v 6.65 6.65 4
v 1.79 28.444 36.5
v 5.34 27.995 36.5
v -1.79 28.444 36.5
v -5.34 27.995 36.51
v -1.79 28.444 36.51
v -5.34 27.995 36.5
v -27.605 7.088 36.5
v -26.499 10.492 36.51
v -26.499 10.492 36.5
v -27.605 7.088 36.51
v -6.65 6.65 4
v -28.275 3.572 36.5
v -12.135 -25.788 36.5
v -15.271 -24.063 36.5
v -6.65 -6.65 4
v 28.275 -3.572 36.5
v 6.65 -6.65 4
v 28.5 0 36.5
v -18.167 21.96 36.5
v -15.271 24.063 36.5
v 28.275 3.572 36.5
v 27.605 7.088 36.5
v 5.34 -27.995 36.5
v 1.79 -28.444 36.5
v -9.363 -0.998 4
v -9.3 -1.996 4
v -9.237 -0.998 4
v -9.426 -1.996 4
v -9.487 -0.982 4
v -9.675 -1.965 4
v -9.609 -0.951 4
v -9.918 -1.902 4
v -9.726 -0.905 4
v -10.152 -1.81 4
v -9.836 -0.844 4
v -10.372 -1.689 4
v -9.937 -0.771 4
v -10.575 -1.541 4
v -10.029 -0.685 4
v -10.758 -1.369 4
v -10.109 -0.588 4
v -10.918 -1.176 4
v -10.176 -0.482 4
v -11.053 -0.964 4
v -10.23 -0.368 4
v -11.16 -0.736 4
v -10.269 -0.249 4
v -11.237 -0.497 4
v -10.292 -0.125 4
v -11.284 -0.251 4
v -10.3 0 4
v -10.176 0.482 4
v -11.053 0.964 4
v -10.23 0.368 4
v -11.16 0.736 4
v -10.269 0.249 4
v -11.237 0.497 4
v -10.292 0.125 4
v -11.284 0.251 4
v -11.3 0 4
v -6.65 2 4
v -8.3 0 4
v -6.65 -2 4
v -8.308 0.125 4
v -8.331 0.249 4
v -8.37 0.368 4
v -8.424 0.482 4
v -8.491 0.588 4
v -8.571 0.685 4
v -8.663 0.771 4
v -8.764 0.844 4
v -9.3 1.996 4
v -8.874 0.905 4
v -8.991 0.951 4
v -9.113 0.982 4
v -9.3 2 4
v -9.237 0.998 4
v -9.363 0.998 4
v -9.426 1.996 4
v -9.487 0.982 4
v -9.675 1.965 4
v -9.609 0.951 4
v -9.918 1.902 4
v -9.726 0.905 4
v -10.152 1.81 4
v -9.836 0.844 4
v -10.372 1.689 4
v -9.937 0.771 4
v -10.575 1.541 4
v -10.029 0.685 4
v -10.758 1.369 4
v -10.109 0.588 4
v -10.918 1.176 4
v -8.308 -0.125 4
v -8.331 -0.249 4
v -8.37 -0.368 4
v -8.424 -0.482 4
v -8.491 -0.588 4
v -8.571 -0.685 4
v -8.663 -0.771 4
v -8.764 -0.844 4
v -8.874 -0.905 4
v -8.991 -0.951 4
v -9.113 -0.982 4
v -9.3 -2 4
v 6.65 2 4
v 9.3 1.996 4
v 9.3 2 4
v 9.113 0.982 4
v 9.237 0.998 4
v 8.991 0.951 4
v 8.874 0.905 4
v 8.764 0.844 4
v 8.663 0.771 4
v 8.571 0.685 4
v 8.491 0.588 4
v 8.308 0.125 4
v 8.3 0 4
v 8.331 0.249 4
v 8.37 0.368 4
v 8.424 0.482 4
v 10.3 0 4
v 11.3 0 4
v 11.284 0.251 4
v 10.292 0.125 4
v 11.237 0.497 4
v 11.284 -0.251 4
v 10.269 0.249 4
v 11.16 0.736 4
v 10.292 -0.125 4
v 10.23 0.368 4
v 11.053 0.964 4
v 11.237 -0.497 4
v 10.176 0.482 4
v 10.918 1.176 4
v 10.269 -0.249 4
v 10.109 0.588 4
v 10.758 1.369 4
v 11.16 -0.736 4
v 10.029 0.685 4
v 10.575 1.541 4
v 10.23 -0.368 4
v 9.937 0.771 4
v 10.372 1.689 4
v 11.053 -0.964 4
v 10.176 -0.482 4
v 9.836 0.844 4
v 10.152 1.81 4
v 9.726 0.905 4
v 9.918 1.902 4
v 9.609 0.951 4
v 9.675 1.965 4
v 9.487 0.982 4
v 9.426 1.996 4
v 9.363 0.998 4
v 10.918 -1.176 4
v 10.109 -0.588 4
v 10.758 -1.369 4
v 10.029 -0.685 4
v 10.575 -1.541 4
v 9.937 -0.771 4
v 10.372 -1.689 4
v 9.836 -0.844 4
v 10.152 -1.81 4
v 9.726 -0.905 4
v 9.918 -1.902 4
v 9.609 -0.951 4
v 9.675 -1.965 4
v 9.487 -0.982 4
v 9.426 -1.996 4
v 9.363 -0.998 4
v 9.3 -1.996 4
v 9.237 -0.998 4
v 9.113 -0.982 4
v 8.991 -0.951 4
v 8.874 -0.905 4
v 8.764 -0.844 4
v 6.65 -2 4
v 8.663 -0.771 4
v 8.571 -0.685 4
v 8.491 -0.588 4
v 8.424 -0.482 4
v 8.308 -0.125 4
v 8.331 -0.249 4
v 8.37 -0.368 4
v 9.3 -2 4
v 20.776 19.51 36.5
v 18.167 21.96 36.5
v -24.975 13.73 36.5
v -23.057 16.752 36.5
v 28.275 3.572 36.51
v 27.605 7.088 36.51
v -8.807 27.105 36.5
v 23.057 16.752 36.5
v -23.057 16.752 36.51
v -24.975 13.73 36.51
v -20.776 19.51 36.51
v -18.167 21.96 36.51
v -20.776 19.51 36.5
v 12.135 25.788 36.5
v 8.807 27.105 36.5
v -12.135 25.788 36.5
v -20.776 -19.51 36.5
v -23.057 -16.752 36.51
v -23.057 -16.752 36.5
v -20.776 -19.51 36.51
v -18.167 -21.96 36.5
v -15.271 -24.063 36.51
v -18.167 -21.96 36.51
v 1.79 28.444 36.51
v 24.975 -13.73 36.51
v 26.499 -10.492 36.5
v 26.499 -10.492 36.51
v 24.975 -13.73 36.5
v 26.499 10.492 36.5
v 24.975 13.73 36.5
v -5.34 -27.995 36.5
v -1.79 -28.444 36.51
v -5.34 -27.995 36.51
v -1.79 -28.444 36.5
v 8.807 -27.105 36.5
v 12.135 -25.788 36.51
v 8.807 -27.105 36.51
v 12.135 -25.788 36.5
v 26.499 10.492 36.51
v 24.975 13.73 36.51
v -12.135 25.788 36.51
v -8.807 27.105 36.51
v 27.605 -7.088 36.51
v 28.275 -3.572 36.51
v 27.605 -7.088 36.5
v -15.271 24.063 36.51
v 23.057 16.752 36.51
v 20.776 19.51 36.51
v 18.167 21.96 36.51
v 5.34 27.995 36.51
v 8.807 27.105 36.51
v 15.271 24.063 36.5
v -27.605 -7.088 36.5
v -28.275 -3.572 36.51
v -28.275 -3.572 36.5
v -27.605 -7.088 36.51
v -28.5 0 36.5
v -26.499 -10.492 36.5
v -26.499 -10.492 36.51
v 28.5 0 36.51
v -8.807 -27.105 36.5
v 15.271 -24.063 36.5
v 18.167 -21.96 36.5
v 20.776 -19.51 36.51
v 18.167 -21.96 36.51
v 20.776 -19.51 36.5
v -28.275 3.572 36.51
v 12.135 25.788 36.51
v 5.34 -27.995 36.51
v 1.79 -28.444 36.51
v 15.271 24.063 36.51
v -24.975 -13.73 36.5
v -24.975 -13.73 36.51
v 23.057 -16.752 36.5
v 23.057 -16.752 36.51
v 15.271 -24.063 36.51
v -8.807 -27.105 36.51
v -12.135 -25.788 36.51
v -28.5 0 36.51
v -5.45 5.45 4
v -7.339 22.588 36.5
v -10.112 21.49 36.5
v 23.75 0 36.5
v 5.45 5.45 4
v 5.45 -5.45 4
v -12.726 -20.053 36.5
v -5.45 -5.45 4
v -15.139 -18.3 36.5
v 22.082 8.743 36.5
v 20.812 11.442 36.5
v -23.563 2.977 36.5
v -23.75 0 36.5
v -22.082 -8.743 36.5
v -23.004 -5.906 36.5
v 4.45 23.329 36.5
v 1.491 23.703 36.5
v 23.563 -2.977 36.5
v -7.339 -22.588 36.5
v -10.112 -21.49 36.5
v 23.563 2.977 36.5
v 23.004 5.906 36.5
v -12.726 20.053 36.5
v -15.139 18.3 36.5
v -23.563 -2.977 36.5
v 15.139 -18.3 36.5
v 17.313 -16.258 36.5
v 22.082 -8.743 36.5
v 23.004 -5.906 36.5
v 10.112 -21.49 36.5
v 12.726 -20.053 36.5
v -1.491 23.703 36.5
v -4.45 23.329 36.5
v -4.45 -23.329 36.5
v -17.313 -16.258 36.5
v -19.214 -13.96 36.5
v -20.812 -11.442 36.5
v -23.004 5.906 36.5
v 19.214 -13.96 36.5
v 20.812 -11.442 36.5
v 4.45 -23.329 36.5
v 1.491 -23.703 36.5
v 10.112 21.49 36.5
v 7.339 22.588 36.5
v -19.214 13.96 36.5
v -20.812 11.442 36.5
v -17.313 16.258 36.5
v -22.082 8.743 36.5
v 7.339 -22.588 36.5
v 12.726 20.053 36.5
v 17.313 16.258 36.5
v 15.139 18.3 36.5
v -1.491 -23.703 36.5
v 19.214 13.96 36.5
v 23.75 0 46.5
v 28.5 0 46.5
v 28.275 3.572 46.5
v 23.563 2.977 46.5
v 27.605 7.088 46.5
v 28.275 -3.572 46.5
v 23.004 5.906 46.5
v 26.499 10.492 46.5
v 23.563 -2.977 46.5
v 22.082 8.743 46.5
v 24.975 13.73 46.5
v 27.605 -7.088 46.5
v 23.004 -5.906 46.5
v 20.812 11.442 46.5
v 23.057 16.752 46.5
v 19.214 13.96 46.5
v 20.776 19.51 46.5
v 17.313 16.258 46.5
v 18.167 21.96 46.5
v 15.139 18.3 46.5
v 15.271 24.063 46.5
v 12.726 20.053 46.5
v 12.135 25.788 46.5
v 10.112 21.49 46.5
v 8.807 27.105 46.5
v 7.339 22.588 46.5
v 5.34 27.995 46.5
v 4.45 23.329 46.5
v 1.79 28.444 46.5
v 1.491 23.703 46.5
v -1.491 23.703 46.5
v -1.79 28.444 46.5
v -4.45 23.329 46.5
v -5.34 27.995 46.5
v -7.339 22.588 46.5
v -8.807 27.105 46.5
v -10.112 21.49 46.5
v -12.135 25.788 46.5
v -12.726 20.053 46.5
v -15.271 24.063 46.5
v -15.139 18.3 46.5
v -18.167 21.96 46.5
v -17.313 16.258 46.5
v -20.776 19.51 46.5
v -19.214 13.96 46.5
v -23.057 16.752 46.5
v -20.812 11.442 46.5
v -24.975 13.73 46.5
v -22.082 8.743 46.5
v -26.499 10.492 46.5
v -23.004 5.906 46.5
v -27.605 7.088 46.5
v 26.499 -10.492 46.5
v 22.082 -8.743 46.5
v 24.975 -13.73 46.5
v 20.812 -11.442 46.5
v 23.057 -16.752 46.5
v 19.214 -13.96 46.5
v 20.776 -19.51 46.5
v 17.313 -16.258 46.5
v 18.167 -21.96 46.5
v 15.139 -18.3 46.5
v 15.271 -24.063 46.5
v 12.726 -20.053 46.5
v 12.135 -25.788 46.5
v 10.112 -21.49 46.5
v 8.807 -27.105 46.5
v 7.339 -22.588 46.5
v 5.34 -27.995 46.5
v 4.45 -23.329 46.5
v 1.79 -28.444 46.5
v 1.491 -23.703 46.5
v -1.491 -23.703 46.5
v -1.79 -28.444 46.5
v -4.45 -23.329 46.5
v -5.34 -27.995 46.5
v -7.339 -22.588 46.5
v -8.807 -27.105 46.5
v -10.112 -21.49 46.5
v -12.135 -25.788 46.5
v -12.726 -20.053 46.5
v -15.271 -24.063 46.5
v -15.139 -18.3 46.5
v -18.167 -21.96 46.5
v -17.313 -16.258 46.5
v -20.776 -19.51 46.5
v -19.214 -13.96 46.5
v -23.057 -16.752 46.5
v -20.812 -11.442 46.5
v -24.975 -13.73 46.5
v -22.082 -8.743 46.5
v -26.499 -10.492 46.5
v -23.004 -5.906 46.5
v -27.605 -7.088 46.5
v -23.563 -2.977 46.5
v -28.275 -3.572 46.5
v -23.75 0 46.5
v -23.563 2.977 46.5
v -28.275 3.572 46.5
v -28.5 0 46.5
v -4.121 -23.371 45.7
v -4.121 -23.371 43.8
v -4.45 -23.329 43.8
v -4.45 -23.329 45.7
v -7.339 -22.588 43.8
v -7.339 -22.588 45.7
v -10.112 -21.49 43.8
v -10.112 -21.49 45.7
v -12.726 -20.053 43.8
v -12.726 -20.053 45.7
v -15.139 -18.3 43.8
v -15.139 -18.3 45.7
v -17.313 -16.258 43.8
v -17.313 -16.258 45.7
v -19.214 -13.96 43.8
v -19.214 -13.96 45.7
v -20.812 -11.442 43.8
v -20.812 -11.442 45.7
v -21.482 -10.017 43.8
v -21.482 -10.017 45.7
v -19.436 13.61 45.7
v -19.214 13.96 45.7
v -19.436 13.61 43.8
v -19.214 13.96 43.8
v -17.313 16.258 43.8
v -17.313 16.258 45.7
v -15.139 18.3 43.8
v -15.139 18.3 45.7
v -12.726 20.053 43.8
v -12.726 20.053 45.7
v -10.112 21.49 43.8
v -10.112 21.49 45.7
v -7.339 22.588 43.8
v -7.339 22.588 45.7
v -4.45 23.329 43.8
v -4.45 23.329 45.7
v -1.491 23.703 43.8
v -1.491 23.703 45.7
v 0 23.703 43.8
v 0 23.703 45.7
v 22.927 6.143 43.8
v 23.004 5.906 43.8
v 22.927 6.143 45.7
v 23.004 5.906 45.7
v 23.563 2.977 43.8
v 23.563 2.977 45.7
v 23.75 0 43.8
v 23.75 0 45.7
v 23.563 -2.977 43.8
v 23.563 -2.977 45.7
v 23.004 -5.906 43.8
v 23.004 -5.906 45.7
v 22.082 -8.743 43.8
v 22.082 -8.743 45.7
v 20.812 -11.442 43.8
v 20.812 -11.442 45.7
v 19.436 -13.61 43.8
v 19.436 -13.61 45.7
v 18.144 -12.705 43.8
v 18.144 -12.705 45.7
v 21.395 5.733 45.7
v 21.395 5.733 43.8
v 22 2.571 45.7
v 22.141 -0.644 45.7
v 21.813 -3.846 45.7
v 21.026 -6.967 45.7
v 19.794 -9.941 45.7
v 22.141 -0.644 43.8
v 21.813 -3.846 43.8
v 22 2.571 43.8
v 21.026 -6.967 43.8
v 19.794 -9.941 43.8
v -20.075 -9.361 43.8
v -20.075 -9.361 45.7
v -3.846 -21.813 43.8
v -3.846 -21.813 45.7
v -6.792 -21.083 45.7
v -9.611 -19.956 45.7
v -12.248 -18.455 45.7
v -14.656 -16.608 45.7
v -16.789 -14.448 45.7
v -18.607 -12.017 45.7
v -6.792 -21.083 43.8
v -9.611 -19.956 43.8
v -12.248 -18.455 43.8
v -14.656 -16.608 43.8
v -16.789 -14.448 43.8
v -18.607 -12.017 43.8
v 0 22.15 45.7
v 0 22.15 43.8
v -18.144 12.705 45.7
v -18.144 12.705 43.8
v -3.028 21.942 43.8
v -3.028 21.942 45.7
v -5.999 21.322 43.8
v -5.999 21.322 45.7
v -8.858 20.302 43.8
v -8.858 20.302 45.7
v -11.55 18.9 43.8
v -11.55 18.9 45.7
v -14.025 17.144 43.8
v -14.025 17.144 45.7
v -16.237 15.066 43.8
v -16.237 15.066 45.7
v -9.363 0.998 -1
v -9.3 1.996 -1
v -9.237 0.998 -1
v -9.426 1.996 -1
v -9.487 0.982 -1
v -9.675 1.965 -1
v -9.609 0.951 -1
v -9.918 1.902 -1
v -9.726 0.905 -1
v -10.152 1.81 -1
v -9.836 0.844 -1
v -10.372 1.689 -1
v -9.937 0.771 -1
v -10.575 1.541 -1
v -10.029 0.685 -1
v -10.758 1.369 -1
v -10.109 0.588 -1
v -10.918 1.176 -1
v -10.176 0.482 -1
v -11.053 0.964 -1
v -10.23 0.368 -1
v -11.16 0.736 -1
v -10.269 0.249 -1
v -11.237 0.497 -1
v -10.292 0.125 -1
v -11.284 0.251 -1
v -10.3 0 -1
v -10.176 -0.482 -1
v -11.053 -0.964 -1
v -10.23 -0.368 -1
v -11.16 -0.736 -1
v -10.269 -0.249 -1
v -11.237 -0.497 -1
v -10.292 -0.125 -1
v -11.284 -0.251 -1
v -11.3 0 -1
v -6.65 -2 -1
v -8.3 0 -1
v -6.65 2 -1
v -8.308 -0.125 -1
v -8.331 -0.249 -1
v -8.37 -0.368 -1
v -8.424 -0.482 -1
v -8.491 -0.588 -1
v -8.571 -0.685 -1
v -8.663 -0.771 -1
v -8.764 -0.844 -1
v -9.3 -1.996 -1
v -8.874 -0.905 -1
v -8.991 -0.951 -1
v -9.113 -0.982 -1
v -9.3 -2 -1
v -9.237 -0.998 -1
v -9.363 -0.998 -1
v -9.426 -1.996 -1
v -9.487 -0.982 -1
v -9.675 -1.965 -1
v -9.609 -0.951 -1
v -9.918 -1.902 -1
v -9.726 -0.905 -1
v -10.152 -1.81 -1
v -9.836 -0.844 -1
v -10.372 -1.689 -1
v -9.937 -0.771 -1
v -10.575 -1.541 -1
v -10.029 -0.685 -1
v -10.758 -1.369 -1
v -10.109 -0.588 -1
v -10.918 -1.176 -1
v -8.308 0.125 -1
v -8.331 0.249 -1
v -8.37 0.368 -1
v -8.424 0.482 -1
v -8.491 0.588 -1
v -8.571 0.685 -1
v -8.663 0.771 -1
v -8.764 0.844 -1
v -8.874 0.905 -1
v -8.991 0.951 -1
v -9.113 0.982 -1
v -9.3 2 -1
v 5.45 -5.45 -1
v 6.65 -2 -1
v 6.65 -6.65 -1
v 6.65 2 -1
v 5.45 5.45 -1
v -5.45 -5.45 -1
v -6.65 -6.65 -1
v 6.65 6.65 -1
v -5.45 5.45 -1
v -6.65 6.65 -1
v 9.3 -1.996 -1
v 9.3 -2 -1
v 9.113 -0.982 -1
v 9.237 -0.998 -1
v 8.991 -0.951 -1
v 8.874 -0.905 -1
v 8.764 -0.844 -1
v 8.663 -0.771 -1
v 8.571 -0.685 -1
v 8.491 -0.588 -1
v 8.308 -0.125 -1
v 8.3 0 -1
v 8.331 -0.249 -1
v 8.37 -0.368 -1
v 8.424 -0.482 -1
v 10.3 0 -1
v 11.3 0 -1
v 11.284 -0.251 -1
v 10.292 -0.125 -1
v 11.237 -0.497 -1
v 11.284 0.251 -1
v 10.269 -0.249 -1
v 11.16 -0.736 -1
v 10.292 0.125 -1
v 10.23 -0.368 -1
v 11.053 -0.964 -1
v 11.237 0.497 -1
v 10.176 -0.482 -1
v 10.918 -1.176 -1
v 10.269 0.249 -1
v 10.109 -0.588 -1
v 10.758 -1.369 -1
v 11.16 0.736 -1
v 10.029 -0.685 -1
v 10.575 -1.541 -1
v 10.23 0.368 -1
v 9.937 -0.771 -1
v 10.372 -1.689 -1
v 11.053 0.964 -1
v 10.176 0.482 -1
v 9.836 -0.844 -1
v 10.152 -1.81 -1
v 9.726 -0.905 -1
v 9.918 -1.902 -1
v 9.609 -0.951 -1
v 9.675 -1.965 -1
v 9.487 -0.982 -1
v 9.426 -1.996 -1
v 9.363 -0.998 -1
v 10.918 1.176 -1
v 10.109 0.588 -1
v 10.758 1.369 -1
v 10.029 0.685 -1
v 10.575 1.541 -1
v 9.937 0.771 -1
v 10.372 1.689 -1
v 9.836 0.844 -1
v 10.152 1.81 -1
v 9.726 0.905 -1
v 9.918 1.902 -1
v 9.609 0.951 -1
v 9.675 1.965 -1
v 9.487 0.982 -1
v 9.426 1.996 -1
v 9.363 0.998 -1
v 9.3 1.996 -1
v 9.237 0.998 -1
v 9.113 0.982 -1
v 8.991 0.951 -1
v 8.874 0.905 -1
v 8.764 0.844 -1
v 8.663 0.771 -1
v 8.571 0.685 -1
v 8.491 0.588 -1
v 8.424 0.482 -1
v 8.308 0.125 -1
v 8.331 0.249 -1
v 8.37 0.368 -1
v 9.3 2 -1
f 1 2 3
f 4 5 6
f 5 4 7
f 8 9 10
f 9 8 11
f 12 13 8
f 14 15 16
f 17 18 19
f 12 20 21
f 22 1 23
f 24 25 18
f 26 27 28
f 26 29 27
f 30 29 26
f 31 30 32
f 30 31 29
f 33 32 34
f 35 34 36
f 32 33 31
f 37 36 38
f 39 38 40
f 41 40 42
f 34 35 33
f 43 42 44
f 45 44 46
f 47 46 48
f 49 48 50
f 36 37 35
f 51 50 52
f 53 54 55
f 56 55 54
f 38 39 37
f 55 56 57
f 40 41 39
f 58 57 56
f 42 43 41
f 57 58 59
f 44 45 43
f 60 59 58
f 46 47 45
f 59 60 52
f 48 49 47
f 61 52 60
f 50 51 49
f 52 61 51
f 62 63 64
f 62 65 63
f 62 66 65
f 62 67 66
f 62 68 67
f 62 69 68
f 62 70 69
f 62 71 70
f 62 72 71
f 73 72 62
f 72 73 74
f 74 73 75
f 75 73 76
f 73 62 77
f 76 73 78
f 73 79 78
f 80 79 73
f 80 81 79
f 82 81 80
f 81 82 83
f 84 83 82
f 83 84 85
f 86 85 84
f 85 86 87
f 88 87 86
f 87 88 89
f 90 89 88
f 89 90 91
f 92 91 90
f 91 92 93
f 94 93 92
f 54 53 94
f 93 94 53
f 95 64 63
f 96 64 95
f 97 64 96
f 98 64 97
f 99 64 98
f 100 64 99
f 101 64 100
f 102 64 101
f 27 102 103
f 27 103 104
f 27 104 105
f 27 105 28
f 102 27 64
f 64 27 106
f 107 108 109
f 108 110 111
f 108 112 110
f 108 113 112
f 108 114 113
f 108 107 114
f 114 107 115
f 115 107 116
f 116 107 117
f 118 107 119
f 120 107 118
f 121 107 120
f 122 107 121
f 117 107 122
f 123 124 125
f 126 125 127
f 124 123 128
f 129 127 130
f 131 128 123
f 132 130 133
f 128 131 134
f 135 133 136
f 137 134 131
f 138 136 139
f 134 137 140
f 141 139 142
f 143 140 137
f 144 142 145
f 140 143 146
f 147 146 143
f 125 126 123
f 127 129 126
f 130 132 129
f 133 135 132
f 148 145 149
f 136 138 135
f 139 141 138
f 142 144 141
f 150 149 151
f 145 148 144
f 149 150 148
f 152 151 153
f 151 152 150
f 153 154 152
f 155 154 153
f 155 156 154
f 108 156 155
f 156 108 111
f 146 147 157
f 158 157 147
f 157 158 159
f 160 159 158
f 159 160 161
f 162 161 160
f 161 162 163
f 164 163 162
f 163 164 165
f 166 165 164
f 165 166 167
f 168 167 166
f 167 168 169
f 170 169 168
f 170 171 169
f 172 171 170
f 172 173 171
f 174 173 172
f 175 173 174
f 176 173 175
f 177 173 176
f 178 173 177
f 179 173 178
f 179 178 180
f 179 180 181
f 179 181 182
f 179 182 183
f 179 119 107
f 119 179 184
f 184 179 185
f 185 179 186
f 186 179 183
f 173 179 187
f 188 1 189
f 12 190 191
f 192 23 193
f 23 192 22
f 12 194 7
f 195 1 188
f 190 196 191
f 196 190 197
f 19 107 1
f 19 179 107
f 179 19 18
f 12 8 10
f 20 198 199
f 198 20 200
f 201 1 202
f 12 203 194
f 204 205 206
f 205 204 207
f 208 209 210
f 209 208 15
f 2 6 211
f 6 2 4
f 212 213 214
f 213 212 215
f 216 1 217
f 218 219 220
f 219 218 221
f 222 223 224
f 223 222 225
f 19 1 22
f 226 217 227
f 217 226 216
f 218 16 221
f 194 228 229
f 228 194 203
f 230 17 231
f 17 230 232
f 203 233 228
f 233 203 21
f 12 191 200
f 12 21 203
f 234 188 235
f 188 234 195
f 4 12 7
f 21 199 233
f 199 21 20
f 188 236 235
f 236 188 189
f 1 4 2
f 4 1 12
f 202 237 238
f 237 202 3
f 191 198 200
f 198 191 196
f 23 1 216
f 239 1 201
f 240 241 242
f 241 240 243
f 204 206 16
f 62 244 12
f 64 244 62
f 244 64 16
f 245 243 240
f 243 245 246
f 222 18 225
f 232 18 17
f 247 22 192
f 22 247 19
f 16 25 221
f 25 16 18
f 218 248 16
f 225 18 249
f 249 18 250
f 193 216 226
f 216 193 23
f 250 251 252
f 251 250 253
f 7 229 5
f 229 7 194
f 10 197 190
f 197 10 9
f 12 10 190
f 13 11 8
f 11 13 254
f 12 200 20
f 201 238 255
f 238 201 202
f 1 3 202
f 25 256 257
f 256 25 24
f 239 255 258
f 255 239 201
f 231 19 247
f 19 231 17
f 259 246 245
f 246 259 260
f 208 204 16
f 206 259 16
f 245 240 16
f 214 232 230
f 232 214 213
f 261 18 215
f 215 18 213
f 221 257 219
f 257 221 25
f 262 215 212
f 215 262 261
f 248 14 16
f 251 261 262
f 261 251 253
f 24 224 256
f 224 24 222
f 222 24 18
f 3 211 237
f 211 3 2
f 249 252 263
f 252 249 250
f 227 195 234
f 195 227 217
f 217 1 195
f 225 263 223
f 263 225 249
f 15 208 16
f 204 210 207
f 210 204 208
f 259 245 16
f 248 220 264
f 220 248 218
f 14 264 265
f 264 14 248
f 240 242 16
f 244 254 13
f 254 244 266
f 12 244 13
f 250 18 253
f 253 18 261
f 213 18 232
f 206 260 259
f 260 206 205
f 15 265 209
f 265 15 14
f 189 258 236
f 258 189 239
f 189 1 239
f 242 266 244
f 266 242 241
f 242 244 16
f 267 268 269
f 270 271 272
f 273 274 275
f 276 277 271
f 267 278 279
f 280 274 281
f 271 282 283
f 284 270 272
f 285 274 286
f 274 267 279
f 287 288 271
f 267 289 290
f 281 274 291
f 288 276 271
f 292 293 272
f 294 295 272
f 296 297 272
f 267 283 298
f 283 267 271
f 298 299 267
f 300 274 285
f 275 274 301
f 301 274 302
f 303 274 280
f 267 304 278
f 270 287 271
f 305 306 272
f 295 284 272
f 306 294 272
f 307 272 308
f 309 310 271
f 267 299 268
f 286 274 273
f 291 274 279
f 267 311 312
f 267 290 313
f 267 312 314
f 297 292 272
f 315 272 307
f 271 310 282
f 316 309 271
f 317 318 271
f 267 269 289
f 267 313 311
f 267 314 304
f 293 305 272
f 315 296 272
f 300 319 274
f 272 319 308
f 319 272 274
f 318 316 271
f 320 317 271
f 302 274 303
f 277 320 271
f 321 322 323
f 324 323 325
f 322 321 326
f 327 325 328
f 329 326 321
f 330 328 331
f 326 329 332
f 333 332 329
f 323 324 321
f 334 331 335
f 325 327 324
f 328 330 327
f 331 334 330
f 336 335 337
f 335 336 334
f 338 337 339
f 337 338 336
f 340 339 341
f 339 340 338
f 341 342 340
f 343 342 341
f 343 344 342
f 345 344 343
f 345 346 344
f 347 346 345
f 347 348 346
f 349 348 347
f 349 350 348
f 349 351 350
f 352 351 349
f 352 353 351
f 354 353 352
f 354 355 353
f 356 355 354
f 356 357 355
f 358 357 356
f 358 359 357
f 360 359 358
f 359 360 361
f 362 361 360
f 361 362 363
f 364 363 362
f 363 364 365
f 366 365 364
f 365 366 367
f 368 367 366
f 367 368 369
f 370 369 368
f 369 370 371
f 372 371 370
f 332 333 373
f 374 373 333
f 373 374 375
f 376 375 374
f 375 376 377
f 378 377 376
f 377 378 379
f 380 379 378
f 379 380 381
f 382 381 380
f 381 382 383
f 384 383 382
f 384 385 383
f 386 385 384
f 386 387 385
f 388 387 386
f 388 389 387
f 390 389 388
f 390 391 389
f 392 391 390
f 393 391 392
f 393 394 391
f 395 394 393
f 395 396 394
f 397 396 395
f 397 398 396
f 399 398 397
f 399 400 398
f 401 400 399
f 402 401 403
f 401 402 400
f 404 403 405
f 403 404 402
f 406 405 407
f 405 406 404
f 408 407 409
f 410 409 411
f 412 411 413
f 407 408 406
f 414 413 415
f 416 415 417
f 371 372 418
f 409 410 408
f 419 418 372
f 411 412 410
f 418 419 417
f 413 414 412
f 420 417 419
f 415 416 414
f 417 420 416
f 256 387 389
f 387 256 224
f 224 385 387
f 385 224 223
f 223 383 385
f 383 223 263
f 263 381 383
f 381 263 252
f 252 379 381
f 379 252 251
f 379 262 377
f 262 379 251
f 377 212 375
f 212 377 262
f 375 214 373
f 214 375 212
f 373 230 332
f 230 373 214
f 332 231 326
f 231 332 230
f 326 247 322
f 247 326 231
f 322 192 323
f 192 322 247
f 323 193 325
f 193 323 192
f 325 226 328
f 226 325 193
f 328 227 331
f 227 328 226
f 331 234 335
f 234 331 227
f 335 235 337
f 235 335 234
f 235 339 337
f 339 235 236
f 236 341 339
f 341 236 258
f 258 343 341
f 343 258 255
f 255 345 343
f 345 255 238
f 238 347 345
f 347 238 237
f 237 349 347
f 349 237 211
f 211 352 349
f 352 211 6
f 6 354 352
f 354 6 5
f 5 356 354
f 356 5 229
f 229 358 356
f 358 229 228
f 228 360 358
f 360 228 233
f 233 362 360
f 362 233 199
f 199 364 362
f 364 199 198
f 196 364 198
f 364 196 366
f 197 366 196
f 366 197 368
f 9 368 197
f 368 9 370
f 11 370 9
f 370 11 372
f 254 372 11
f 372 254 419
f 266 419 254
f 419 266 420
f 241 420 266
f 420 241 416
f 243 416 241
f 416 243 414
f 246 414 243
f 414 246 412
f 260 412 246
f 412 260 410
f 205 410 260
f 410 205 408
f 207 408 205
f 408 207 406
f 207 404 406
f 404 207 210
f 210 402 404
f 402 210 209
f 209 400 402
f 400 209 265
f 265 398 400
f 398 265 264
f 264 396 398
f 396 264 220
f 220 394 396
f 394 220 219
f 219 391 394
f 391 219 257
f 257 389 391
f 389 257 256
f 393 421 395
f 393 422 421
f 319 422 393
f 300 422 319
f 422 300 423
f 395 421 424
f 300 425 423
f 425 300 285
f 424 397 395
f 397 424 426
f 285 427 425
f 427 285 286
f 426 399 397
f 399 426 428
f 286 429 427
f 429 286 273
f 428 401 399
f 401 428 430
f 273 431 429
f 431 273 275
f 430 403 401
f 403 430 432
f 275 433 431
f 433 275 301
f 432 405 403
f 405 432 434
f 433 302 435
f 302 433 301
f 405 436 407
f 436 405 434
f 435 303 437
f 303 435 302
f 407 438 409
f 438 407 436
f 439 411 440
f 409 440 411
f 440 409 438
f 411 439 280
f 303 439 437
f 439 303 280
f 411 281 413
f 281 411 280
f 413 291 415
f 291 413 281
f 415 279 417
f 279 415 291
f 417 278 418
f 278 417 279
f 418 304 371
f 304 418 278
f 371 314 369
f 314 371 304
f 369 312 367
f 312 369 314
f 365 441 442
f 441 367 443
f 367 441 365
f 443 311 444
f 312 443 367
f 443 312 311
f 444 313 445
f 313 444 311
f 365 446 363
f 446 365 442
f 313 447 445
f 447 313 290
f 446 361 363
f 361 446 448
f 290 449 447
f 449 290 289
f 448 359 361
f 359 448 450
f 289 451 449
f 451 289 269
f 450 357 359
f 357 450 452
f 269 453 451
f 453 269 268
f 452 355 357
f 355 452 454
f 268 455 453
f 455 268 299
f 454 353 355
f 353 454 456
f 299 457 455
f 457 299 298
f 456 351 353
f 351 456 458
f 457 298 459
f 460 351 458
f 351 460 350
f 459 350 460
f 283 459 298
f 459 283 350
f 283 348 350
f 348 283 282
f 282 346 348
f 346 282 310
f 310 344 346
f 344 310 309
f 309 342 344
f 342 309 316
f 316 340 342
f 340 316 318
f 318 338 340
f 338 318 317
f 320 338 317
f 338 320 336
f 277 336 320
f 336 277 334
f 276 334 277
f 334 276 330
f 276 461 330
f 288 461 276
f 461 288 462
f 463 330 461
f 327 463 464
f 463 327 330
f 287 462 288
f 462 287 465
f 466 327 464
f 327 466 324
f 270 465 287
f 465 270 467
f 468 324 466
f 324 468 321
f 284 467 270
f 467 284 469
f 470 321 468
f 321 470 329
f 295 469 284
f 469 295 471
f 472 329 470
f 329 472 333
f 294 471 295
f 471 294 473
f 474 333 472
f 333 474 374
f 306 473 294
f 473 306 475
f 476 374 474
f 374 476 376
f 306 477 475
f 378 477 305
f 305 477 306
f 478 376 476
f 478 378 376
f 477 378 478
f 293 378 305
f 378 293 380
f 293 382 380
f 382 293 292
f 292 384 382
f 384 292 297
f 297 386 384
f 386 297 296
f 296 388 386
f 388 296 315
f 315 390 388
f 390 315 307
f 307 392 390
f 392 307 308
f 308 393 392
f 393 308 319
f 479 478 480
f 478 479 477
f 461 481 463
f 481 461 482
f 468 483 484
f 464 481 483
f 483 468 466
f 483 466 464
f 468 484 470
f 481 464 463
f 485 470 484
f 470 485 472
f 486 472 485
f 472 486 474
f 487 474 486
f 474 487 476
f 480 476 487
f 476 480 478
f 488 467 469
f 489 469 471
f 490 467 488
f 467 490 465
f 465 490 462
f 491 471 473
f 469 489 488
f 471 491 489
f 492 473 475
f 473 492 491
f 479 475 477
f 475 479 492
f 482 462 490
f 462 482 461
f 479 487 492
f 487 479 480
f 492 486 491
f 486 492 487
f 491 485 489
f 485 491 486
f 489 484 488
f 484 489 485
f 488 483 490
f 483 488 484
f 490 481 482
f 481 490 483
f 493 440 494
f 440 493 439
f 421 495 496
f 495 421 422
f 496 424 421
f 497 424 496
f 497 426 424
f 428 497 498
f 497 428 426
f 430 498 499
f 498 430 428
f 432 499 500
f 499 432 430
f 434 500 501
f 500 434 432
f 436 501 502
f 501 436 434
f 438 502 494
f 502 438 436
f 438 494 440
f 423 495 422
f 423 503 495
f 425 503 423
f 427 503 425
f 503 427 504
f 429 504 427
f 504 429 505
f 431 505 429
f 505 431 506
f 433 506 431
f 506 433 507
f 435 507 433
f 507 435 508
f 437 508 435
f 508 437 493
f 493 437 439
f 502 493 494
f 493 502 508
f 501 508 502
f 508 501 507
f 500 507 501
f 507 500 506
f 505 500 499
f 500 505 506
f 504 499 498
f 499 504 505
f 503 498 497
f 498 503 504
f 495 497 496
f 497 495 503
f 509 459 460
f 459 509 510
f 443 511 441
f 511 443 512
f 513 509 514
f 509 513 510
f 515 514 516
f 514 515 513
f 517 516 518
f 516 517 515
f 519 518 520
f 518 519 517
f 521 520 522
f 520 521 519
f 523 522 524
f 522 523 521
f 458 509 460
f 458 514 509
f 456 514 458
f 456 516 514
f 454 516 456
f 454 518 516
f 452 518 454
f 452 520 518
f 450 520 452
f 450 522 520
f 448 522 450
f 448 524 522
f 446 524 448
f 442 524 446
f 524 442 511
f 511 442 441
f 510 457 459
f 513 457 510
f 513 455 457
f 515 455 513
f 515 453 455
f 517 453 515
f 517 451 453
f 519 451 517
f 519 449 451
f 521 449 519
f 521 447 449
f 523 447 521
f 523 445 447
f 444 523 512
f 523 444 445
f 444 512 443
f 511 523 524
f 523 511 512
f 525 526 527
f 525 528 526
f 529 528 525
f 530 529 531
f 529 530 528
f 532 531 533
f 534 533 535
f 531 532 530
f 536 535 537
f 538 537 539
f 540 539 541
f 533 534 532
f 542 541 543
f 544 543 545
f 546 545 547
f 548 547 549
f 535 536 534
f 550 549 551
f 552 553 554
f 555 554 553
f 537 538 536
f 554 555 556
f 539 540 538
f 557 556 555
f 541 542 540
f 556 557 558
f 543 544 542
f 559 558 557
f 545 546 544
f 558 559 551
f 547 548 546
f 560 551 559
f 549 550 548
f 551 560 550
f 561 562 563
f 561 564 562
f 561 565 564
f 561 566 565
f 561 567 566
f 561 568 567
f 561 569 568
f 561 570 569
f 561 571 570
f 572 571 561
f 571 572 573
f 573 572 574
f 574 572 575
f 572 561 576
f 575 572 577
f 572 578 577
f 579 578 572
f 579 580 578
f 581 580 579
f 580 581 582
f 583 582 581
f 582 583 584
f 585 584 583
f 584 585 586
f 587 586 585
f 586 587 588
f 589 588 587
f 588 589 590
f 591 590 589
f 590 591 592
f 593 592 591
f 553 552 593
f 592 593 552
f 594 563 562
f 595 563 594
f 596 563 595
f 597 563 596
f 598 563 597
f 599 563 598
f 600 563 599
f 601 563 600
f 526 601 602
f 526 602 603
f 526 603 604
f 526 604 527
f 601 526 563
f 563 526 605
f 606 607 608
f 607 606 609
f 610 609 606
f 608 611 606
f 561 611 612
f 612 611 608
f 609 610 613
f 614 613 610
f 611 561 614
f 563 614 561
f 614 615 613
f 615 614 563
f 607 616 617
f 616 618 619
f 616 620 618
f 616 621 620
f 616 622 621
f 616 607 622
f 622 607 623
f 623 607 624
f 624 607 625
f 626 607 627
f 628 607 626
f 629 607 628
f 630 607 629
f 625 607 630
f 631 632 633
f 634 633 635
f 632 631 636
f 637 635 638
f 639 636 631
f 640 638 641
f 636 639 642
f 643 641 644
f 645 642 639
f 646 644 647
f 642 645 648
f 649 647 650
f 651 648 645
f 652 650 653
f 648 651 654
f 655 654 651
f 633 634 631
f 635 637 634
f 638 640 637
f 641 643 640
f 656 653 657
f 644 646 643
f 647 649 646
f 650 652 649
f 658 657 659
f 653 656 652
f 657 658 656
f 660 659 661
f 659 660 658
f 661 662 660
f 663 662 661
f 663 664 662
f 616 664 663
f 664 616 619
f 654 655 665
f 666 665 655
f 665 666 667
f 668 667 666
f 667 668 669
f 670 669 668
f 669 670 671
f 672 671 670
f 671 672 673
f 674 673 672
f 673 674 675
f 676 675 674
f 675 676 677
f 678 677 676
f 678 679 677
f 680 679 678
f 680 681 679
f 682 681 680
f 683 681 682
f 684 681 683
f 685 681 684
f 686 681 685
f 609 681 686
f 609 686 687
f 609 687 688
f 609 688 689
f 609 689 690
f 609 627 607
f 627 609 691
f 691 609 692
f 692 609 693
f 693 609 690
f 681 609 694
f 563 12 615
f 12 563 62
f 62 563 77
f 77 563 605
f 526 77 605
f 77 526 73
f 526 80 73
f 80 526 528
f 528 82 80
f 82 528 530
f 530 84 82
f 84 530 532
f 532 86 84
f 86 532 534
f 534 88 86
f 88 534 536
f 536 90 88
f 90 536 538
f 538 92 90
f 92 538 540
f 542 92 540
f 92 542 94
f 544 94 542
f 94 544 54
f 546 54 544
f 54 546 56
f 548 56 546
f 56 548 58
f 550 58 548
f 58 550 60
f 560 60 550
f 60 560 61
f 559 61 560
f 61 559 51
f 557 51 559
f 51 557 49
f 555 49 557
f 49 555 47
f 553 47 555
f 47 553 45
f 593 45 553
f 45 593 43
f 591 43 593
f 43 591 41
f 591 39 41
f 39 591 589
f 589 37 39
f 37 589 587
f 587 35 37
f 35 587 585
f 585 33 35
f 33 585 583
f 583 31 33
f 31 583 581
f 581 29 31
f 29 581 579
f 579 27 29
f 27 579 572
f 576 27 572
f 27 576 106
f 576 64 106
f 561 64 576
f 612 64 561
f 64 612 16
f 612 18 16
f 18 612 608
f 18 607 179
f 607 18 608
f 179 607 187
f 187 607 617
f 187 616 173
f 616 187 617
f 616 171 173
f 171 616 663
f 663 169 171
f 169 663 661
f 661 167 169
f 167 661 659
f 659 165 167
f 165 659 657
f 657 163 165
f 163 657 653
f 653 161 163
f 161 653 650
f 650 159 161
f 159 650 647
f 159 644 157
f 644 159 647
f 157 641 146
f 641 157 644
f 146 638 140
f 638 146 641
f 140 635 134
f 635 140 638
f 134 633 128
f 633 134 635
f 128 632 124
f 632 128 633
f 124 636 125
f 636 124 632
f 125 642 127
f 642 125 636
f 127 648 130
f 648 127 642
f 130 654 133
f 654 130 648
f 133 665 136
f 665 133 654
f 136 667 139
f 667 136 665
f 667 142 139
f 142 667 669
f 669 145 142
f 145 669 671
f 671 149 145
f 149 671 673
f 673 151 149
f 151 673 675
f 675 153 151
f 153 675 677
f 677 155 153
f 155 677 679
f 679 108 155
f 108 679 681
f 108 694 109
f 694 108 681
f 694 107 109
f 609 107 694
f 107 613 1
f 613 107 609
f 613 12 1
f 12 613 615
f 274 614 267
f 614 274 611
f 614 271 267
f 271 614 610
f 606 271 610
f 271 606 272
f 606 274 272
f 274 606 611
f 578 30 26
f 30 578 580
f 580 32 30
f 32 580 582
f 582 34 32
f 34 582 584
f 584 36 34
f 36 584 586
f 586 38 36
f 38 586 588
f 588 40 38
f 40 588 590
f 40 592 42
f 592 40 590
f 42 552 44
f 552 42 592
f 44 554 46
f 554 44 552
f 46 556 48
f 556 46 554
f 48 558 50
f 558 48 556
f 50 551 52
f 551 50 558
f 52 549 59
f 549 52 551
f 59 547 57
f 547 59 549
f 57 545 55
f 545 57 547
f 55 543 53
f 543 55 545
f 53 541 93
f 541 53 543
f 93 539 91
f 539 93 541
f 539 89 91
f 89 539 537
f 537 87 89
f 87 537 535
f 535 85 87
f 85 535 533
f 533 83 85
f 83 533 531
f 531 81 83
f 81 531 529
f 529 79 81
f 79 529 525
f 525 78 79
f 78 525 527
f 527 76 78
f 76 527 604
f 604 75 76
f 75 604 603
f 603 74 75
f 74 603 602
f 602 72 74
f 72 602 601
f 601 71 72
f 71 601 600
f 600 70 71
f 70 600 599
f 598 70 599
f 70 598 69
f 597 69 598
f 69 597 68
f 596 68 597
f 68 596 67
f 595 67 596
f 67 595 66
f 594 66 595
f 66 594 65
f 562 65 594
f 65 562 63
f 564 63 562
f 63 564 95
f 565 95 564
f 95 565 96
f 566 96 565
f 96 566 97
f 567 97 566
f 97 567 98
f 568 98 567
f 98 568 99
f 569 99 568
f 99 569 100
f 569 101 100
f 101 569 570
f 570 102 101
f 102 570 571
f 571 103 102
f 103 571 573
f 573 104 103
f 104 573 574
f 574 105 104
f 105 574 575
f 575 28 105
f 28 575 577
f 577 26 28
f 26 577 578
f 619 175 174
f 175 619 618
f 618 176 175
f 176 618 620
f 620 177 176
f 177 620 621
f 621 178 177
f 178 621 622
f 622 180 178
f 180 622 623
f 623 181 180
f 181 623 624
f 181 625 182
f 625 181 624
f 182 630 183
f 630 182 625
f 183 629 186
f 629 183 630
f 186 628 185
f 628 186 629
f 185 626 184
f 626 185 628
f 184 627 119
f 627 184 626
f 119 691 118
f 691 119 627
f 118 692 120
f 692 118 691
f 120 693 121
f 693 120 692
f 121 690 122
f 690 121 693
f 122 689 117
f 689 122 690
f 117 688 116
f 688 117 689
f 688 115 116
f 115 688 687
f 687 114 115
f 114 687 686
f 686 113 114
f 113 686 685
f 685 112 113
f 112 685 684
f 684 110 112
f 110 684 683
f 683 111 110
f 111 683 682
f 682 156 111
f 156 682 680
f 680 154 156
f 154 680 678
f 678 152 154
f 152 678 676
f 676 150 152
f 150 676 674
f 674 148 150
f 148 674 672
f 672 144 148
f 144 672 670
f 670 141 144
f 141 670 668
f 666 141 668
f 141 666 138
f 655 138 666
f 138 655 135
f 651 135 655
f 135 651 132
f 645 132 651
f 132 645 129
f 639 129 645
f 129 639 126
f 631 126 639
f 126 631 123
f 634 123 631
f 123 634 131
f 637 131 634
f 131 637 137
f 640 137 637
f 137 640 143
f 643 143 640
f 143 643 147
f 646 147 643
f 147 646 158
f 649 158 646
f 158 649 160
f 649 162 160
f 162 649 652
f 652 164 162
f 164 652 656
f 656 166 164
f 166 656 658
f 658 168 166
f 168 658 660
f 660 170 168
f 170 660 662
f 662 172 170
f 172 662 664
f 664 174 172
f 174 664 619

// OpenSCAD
$fn=50;

// diameter (not radius!)
throat = 44.5;
inner = 47.5;
outer = 57;

lip_width = 1.7;
lip_height = 1.9;
lip_positions = [[50,-35], [55,-155], [55,-270]];
lip_offset = 0.8;

flange_height = 10;

module rounding_circle(radius, corner_radius, angle) {
  rotate_extrude() {
    translate([radius, angle>=180?corner_radius:0]) difference() {
      rotate([0,0,angle]) square(corner_radius);
      circle(corner_radius);
    }
  }
}

module lip(angle, offs) {
  rotate([0,0,offs]) translate([0,0,lip_height/2])
   rotate_extrude(angle=angle)
    translate([inner/2 +0.1 - lip_width/2,0,0]) square([lip_width,lip_height], center=true);
}

module nikon_f_flange() {
  difference() {
    linear_extrude(flange_height) difference() {
      circle(outer/2);
      circle(inner/2);
    }
    translate([0,0,flange_height-1]) rounding_circle(29,1,0);
  }

  translate([0,0,flange_height - lip_height - lip_offset]) {
    for (i = lip_positions) {
      lip(i[0],i[1]);
    }
  }

}

screw_distance = 18.6;
mount_base = 13.3;
mount_wall = 1.2;
sensor_distance = 46.5;

base_thickness = 4;
// if the sensor pertrudes from the mounting plane
sensor_offset = 1;

module screwpost_2d() {
  r = 2;
  screw=1;
  difference() {
    union() {
      circle(r);
      translate([0,-r]) square([(screw_distance-mount_base)/2,2*r]);
    }
    circle(screw);
  }
}

module mount_base_2d() {
  difference() {
    square(mount_base,center=true);
    offset(-mount_wall) square(mount_base, center=true);
  }
}

module sensor_mount() {
  mount_base_2d();
  translate([-screw_distance/2,0]) screwpost_2d();
  translate([ screw_distance/2,0]) rotate([0,0,180]) screwpost_2d();
}


translate([0,0,base_thickness]) {
  h = sensor_distance-flange_height-base_thickness;
  difference() {
    hull() {
      linear_extrude(0.01) square(mount_base, center=true);
      translate([0,0,h]) linear_extrude(0.01) circle(d=outer);
    }
    hull() {
      linear_extrude(0.01) offset(-mount_wall)square(mount_base, center=true);
      translate([0,0,h]) linear_extrude(0.01) circle(d=inner);
    }
  }
}

translate([0,0,-sensor_offset]) linear_extrude(base_thickness + sensor_offset) sensor_mount();
translate([0,0,sensor_distance-flange_height]) nikon_f_flange();
